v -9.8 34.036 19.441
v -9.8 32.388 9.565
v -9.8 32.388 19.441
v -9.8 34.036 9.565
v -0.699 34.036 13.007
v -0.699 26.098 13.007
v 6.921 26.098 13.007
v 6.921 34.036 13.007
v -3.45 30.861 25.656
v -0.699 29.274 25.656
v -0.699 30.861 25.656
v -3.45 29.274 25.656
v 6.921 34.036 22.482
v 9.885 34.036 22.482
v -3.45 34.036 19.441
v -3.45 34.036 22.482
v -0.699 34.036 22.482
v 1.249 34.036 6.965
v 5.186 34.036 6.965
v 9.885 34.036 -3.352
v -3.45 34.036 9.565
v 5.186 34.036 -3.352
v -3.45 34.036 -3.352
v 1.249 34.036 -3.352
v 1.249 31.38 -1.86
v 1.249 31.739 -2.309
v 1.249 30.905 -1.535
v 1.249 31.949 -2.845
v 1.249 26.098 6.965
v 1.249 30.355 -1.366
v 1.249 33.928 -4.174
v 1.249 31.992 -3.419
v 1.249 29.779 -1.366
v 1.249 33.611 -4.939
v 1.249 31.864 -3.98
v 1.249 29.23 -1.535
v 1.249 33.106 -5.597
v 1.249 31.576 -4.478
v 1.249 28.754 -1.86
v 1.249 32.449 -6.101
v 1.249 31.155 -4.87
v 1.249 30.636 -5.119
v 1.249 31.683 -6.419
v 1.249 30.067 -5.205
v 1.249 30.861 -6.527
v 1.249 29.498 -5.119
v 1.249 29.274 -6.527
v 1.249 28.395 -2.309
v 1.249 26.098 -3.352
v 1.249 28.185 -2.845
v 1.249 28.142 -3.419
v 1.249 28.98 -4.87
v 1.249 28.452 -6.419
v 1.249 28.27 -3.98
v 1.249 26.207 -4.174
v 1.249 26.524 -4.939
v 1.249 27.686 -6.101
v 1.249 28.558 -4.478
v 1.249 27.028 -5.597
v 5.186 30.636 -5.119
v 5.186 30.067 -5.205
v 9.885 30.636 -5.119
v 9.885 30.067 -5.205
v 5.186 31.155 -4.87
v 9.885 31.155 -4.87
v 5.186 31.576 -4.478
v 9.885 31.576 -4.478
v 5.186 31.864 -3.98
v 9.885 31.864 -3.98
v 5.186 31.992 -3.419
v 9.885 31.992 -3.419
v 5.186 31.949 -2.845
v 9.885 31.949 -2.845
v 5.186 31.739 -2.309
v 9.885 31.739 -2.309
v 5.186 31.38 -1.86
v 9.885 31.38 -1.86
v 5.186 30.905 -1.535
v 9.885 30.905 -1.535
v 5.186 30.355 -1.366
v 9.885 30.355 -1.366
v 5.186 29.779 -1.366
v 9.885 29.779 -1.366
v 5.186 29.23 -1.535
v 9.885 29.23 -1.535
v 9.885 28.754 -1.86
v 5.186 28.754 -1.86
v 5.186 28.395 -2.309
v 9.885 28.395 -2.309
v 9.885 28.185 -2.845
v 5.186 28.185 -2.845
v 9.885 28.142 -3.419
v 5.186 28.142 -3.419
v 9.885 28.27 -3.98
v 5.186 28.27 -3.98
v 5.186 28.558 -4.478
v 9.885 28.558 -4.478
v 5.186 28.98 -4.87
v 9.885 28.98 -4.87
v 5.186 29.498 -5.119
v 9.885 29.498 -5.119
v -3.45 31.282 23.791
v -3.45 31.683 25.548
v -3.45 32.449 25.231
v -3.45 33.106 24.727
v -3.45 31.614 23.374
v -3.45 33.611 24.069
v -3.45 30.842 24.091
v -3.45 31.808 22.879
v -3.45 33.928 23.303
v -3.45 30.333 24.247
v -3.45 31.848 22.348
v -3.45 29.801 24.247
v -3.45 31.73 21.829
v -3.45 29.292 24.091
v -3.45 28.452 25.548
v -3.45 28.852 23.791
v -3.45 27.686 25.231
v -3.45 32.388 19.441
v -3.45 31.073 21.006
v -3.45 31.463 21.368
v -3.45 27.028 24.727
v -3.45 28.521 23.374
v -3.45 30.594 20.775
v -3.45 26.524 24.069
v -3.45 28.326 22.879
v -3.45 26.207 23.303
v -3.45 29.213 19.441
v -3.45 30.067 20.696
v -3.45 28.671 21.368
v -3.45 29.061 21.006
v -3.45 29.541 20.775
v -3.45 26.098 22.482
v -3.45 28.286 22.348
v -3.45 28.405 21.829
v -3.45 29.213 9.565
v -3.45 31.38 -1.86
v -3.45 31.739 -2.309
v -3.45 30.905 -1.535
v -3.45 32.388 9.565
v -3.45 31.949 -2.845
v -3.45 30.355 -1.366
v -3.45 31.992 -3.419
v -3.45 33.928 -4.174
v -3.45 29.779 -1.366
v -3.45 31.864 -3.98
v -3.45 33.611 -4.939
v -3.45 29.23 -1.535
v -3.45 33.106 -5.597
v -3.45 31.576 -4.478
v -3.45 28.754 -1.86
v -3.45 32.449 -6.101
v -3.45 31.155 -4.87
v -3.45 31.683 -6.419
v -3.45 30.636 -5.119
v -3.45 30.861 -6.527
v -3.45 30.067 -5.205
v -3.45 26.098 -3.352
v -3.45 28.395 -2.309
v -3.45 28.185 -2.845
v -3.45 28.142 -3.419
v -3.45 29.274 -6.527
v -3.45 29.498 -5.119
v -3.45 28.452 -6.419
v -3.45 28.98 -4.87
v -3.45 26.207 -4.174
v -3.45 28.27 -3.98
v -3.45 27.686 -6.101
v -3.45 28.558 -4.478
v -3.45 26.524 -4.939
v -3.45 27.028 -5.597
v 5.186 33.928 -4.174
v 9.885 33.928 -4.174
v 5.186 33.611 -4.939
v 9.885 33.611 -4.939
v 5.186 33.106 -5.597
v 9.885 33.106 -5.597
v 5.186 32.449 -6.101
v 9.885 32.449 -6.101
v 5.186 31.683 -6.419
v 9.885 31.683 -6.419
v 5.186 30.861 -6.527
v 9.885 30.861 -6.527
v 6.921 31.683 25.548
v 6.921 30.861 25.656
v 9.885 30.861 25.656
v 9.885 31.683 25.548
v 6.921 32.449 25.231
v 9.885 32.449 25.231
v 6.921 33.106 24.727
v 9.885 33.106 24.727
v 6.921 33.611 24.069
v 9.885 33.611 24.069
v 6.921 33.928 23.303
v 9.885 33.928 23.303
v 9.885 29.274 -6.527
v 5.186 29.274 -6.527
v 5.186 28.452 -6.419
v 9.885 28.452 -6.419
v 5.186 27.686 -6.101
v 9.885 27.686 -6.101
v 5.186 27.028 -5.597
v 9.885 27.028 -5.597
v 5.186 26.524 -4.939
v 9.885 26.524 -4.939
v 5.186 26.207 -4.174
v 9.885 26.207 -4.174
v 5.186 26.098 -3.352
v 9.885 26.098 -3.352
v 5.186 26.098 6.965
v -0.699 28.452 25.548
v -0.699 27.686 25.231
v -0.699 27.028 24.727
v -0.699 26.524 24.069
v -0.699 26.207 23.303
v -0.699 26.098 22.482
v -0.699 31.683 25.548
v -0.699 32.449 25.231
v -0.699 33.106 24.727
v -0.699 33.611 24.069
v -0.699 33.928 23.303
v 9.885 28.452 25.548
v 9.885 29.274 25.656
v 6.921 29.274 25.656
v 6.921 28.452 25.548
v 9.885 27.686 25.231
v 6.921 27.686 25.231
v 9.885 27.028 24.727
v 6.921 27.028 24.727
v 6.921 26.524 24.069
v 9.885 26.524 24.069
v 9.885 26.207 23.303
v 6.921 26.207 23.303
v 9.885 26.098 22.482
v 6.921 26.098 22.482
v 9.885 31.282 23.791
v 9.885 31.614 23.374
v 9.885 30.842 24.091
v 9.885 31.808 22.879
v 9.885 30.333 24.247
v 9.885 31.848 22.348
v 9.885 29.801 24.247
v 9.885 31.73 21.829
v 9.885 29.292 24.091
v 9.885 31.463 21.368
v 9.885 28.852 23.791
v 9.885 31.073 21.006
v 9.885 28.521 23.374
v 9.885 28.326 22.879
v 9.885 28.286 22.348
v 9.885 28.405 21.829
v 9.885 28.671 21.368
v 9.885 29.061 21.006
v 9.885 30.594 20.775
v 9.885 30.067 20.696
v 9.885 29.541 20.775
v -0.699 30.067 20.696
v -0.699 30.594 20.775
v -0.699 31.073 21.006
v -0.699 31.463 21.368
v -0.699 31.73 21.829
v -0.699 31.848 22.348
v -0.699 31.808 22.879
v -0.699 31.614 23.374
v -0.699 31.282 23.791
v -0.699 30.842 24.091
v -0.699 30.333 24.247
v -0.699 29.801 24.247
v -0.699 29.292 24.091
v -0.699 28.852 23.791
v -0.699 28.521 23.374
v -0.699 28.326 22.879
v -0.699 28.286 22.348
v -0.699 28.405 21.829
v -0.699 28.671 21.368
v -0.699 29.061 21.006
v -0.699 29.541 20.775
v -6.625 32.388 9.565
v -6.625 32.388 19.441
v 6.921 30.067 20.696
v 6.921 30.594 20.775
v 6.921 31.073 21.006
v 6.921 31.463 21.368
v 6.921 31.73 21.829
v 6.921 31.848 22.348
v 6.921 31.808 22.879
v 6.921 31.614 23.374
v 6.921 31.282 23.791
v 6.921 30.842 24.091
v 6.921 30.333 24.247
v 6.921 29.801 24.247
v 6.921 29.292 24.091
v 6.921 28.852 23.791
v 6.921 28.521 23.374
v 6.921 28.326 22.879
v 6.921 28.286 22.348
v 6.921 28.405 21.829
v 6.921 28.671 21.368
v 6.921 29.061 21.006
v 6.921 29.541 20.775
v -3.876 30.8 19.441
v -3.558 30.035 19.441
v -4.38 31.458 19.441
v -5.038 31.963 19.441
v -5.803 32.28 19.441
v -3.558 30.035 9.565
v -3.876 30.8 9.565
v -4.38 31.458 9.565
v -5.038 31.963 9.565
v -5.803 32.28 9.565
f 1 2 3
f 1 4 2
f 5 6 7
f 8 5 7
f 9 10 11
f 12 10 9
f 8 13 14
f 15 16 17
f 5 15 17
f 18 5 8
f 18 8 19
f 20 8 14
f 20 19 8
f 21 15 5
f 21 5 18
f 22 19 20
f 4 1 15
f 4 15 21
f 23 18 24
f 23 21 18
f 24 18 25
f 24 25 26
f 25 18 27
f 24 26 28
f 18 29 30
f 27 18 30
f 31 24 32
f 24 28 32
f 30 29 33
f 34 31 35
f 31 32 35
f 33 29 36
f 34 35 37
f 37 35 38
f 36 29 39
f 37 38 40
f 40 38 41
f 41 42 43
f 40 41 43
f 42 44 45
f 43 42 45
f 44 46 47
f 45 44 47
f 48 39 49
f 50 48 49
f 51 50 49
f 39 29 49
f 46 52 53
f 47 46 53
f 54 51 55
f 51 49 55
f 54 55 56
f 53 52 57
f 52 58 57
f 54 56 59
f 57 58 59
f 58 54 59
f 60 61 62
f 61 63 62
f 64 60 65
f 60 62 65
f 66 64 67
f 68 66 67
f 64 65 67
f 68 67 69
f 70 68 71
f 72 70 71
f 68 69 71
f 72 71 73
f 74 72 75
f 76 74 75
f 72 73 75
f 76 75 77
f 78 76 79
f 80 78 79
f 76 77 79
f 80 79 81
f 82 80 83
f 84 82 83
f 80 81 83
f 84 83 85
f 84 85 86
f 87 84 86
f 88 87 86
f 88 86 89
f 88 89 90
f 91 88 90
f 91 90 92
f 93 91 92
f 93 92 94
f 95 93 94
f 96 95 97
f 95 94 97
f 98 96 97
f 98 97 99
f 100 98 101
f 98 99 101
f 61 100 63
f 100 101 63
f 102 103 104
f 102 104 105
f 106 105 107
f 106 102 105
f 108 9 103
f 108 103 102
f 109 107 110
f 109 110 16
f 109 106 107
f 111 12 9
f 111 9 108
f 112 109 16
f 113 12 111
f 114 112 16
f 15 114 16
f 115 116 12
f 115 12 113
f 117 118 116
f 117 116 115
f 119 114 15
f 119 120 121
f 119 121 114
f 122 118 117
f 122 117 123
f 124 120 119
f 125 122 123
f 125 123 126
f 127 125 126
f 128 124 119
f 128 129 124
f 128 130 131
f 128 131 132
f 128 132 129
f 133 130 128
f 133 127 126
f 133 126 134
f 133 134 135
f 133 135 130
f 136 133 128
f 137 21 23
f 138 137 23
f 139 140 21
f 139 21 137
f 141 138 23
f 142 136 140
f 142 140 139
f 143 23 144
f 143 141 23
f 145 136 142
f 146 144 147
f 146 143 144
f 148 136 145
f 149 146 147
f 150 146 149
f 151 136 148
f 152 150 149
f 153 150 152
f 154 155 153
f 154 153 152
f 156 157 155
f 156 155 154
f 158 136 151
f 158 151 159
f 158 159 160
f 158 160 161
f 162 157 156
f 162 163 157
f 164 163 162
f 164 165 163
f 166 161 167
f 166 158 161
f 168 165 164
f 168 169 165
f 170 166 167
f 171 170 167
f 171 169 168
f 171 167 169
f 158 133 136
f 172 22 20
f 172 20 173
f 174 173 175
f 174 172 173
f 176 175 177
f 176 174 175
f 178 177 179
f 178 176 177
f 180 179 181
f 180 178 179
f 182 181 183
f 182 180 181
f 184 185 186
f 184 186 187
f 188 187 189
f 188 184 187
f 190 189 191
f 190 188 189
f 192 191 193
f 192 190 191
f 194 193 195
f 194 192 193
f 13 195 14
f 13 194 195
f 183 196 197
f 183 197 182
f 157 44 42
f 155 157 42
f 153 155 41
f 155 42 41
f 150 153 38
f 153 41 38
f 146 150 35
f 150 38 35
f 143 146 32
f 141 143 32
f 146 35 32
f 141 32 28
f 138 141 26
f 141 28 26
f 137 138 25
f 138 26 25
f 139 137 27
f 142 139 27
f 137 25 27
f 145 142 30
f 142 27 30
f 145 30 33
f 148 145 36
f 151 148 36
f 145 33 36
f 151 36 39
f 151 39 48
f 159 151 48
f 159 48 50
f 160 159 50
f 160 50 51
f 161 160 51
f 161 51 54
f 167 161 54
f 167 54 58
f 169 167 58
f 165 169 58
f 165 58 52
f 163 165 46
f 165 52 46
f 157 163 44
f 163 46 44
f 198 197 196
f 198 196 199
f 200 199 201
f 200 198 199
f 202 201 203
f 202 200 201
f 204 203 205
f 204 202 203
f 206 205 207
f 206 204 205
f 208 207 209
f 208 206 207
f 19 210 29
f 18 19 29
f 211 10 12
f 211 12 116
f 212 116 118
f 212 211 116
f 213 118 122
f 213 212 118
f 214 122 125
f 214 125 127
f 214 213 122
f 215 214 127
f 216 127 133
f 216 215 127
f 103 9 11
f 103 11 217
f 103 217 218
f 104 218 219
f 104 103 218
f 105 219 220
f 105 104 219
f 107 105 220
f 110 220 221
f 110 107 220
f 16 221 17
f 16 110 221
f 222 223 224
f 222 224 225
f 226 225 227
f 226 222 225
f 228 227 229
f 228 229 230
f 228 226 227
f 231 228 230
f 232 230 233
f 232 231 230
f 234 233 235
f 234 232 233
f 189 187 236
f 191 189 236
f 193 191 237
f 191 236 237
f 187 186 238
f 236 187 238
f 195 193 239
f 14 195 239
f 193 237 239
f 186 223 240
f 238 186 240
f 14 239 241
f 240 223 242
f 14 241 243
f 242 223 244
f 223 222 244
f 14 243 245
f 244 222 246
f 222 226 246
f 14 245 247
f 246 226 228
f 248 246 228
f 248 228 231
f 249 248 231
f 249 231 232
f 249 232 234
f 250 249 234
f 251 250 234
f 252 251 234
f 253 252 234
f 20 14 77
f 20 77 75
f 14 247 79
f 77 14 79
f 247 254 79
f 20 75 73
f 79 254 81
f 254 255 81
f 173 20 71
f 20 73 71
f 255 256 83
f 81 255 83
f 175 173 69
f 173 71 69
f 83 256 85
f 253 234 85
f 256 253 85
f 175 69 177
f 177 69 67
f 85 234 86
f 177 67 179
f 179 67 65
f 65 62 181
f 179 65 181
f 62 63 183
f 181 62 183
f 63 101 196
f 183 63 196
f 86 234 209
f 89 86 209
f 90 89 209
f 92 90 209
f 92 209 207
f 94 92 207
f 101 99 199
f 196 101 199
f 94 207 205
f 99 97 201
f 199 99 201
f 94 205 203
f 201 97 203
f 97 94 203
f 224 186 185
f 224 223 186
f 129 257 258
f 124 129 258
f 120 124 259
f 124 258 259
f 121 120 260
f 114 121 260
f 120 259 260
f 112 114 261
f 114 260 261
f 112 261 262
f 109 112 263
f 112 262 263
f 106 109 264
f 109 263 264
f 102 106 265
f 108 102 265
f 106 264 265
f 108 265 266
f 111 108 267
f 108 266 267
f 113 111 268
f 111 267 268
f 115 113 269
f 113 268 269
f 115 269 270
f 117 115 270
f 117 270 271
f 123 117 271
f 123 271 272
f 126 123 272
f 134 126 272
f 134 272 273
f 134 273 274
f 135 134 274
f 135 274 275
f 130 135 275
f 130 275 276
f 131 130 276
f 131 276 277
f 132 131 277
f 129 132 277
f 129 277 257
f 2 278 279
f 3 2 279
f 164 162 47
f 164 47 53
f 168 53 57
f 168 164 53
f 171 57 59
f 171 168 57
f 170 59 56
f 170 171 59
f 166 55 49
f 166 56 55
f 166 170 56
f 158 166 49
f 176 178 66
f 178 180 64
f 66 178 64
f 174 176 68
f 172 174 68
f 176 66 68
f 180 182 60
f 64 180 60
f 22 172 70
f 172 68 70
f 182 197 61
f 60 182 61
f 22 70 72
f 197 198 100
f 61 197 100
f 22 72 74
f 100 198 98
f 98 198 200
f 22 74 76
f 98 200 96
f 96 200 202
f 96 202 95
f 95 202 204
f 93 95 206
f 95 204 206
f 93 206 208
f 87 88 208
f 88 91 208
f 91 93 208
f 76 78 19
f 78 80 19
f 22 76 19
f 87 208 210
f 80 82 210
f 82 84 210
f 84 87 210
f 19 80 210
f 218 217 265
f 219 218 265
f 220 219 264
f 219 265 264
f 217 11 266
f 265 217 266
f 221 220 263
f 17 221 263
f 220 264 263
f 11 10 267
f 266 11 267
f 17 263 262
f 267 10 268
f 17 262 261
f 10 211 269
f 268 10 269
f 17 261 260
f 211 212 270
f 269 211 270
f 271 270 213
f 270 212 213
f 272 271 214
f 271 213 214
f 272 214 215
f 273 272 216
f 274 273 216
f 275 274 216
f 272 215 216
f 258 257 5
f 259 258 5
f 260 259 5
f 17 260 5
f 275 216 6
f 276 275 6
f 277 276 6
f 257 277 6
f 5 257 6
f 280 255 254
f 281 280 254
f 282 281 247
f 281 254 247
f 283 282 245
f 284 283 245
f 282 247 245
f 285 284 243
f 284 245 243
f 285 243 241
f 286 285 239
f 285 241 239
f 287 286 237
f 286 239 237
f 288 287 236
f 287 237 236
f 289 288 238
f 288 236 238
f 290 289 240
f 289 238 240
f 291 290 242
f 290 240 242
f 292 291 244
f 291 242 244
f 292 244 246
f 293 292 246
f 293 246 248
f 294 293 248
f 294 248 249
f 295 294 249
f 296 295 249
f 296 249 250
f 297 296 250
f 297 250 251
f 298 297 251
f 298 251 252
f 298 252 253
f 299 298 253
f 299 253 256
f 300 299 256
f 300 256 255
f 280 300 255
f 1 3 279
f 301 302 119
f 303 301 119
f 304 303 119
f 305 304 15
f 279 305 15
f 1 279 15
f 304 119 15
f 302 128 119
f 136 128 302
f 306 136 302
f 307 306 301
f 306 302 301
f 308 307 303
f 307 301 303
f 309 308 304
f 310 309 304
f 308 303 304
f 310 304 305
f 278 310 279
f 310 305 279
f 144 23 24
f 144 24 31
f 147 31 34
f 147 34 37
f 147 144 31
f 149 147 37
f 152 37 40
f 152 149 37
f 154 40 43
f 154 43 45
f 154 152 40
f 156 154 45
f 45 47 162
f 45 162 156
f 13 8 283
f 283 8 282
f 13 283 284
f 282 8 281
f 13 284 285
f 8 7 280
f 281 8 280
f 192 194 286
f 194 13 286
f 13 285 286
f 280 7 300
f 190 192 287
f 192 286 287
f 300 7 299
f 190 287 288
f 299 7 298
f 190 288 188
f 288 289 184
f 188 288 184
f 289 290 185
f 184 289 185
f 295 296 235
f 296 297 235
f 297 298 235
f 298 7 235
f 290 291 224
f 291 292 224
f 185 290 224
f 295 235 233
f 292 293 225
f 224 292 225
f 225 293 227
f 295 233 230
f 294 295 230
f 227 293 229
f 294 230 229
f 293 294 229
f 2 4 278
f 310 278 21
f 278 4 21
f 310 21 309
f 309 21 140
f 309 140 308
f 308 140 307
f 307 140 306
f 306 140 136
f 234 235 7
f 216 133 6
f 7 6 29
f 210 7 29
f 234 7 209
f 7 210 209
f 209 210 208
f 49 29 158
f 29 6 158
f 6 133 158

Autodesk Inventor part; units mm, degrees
ref_plane "YZ Plane" through (0, 0, 0) normal (1, 0, 0) x (0, 1, 0)
ref_plane "XZ Plane" through (0, 0, 0) normal (0, 1, 0) x (-1, 0, 0)
ref_plane "XY Plane" through (0, 0, 0) normal (0, 0, 1) x (1, 0, 0)
ref_plane "Work Plane1" through (8.001, 26.0985, -18.0717) normal (0, 1, 0) x (0, 0, -1)
sketch "Sketch1" plane through (8.001, 26.0985, -18.0717) normal (0, 1, 0) x (0, 0, -1)
  line L0 (-43.7282, -1.4601) -> (-43.7282, -1.8842)
  line L1 (-43.7282, -1.8842) -> (-9.3098, -1.8842)
  line L2 (-9.3098, -1.8842) -> (-9.3098, 2.815)
  line L3 (-43.7282, 11.0271) -> (-43.7282, 11.4512)
  line L4 (-43.7282, 11.4512) -> (-9.3098, 11.4512)
  line L5 (-9.3098, 11.4512) -> (-9.3098, 6.752)
  line L6 (-43.7282, -1.4601) -> (-43.7282, 11.0271)
  line L7 (-9.3098, 2.815) -> (-25.0363, 2.815)
  line L8 (-25.0363, 2.815) -> (-25.0363, 6.752)
  line L9 (-25.0363, 6.752) -> (-9.3098, 6.752)
  line L10 (-18.0537, 2.815) -> (-18.0537, -1.8842) construction
  line L11 (-18.0537, 6.752) -> (-18.0537, 11.4512) construction
  line L12 (-16.6851, 3.45) -> (-16.6851, 6.117) construction
  line L13 (-16.6851, 3.45) -> (-12.9069, 3.45) construction
  line L14 (-12.9069, 3.45) -> (-12.9069, 6.117) construction
  line L15 (-12.9069, 6.117) -> (-16.6851, 6.117) construction
  point P0 (-18.0717, 8.001)
  dimension "d19" = 0.635
  dimension "d20" = 0.635
extrude "Extrusion1" add sketch "Sketch1" along normal blind 7.9375
sketch "Sketch2" plane through (9.8852, 26.0985, 25.6565) normal (1, 0, 0) x (0, 0, -1)
  line L0 (34.4184, 0) -> (0, 0) construction
  line L1 (34.4184, 0) -> (34.4184, 7.9375) construction
  line L2 (0, 7.9375) -> (34.4184, 7.9375) construction
  line L3 (0, 0) -> (0, 7.9375) construction
  line L4 (34.4184, 0) -> (34.4184, 7.9375) construction
  line L5 (34.4184, 3.9687) -> (0, 3.9687) construction
  line L6 (34.4184, 0) -> (0, 0) construction
  line L7 (28.9311, 0) -> (28.9311, 7.9375) construction
  line L8 (34.4184, 7.9375) -> (14.8298, 7.9375) construction
  circle A0 centre (28.9311, 3.9687) radius 1.9304
  point P0 (25.6565, -26.0985)
  dimension "d8" = 3.8608
extrude "Extrusion2" cut sketch "Sketch2" against normal through all
fillet "Fillet1" radius 3.175 2 edges at (3.2175, 34.036, 25.6565) (3.2175, 26.0985, 25.6565)
sketch "Sketch3" plane through (9.8852, 26.0985, -8.7619) normal (1, 0, 0) x (0, 0, -1)
  circle A0 centre (-5.4873, 3.9688) radius 1.9304 projected
  line L0 (0, 0) -> (-31.2434, 0) projected
  line L1 (0, 0) -> (0, 7.9375) projected
  line L2 (-31.2434, 7.9375) -> (0, 7.9375) projected
  line L3 (-34.4184, 3.175) -> (-34.4184, 4.7625) projected
  line L4 (-31.2434, 3.175) -> (-31.2434, 4.7625) construction
  circle A1 centre (-31.2434, 3.9687) radius 1.7859
  arc A2 (-34.4184, 3.175) -> (-31.2434, 0) centre (-31.2434, 3.175) ccw projected
  arc A3 (-31.2434, 7.9375) -> (-34.4184, 4.7625) centre (-31.2434, 4.7625) ccw projected
  point P0 (-8.7619, -26.0985)
  dimension "d7" = 3.5719
extrude "Extrusion3" cut sketch "Sketch3" against normal through all contours A1
sketch "Sketch5" plane through (9.8852, 26.0985, -8.7619) normal (1, 0, 0) x (0, 0, -1)
  circle A0 centre (-31.2434, 3.9688) radius 1.7859 construction
  circle A1 centre (-5.4873, 3.9688) radius 1.9304 construction
  line L0 (0, 0) -> (-31.2434, 0) construction
  line L1 (0, 0) -> (0, 7.9375) construction
  line L2 (-31.2434, 7.9375) -> (0, 7.9375) construction
  line L3 (-34.4184, 3.175) -> (-34.4184, 4.7625) construction
  line L4 (-15.9544, 0) -> (0, 0) projected
  line L5 (-2.2351, 0) -> (-2.2351, 7.9375)
  line L6 (-15.9544, 7.9375) -> (0, 7.9375) projected
  line L7 (-2.2351, 0) -> (-8.7527, 0)
  line L8 (-34.4184, 7.9375) -> (0, 7.9375) projected
  line L9 (-2.2351, 0) -> (0, 0)
  line L10 (0, 0) -> (0, 7.9375)
  line L11 (0, 7.9375) -> (-2.2351, 7.9375)
  line L12 (-2.2351, 7.9375) -> (-2.2351, 0)
  arc A2 (-34.4184, 3.175) -> (-31.2434, 0) centre (-31.2434, 3.175) ccw projected
  arc A3 (-31.2434, 7.9375) -> (-34.4184, 4.7625) centre (-31.2434, 4.7625) ccw projected
  point P0 (-8.7619, -26.0985)
extrude "Extrusion4" cut sketch "Sketch5" against normal through all
fillet "Fillet2" radius 3.175 4 edges at (7.5356, 34.036, -6.5269) (-1.1006, 34.036, -6.5269) (7.5356, 26.0985, -6.5269) (-1.1006, 26.0985, -6.5269)
sketch "Sketch6" plane through (8.001, 26.0985, -18.0717) normal (0, -1, 0) x (1, 0, 0)
  line L0 (-1.7153, 46.6729) -> (-1.7153, 39.3669) construction
  line L1 (-8.0653, 39.3669) -> (-8.0653, 46.6729) construction
  line L2 (-1.0803, 47.2656) -> (-1.0803, 39.3486) construction
  line L3 (-8.7003, 39.3486) -> (-8.7003, 42.6343) construction
  line L4 (-1.0803, 47.2656) -> (-8.7003, 47.2656)
  line L5 (-8.7003, 47.2656) -> (-8.7003, 31.0791)
  line L6 (-8.7003, 31.0791) -> (-1.0803, 31.0791)
  line L7 (-1.0803, 31.0791) -> (-1.0803, 47.2656)
  point P0 (-8.001, 18.0717)
  dimension "d12" = 0.635
  dimension "d13" = 0.635
extrude "Extrusion5" cut sketch "Sketch6" against normal through all
sketch "Sketch8" plane through (-3.4502, 29.2735, 25.6565) normal (-1, 0, 0) x (0, 0, 1)
  arc A0 (-32.1833, 0) -> (-29.0083, -3.175) centre (-29.0083, 0) ccw construction
  line L0 (-3.175, -3.175) -> (-29.0083, -3.175) construction
  arc A1 (-3.175, -3.175) -> (0, 0) centre (-3.175, 0) ccw construction
  line L1 (0, 0) -> (0, 1.5875) construction
  arc A2 (0, 1.5875) -> (-3.175, 4.7625) centre (-3.175, 1.5875) ccw construction
  line L2 (-29.0083, 4.7625) -> (-3.175, 4.7625) construction
  arc A3 (-29.0083, 4.7625) -> (-32.1833, 1.5875) centre (-29.0083, 1.5875) ccw construction
  line L3 (-32.1833, 1.5875) -> (-32.1833, 0) construction
  circle A4 centre (-3.175, 0.7938) radius 1.7859 construction
  circle A5 centre (-28.9311, 0.7938) radius 1.9304 construction
  line L4 (-3.175, 4.7625) -> (-29.0083, 4.7625) projected
  line L5 (-6.2153, 4.7625) -> (-16.0917, 4.7625)
  line L6 (-16.0917, 4.7625) -> (-16.0917, 3.1144)
  line L7 (-16.0917, 3.1144) -> (-6.2153, 3.1144)
  line L8 (-6.2153, 3.1144) -> (-6.2153, 4.7625)
  point P0 (-25.6565, -29.2735)
extrude "Extrusion7" add sketch "Sketch8" along normal blind 6.35
fillet "Fillet3" radius 3.175 1 edges at (-3.4502, 32.3879, 14.503)
properties part number "lever2"
